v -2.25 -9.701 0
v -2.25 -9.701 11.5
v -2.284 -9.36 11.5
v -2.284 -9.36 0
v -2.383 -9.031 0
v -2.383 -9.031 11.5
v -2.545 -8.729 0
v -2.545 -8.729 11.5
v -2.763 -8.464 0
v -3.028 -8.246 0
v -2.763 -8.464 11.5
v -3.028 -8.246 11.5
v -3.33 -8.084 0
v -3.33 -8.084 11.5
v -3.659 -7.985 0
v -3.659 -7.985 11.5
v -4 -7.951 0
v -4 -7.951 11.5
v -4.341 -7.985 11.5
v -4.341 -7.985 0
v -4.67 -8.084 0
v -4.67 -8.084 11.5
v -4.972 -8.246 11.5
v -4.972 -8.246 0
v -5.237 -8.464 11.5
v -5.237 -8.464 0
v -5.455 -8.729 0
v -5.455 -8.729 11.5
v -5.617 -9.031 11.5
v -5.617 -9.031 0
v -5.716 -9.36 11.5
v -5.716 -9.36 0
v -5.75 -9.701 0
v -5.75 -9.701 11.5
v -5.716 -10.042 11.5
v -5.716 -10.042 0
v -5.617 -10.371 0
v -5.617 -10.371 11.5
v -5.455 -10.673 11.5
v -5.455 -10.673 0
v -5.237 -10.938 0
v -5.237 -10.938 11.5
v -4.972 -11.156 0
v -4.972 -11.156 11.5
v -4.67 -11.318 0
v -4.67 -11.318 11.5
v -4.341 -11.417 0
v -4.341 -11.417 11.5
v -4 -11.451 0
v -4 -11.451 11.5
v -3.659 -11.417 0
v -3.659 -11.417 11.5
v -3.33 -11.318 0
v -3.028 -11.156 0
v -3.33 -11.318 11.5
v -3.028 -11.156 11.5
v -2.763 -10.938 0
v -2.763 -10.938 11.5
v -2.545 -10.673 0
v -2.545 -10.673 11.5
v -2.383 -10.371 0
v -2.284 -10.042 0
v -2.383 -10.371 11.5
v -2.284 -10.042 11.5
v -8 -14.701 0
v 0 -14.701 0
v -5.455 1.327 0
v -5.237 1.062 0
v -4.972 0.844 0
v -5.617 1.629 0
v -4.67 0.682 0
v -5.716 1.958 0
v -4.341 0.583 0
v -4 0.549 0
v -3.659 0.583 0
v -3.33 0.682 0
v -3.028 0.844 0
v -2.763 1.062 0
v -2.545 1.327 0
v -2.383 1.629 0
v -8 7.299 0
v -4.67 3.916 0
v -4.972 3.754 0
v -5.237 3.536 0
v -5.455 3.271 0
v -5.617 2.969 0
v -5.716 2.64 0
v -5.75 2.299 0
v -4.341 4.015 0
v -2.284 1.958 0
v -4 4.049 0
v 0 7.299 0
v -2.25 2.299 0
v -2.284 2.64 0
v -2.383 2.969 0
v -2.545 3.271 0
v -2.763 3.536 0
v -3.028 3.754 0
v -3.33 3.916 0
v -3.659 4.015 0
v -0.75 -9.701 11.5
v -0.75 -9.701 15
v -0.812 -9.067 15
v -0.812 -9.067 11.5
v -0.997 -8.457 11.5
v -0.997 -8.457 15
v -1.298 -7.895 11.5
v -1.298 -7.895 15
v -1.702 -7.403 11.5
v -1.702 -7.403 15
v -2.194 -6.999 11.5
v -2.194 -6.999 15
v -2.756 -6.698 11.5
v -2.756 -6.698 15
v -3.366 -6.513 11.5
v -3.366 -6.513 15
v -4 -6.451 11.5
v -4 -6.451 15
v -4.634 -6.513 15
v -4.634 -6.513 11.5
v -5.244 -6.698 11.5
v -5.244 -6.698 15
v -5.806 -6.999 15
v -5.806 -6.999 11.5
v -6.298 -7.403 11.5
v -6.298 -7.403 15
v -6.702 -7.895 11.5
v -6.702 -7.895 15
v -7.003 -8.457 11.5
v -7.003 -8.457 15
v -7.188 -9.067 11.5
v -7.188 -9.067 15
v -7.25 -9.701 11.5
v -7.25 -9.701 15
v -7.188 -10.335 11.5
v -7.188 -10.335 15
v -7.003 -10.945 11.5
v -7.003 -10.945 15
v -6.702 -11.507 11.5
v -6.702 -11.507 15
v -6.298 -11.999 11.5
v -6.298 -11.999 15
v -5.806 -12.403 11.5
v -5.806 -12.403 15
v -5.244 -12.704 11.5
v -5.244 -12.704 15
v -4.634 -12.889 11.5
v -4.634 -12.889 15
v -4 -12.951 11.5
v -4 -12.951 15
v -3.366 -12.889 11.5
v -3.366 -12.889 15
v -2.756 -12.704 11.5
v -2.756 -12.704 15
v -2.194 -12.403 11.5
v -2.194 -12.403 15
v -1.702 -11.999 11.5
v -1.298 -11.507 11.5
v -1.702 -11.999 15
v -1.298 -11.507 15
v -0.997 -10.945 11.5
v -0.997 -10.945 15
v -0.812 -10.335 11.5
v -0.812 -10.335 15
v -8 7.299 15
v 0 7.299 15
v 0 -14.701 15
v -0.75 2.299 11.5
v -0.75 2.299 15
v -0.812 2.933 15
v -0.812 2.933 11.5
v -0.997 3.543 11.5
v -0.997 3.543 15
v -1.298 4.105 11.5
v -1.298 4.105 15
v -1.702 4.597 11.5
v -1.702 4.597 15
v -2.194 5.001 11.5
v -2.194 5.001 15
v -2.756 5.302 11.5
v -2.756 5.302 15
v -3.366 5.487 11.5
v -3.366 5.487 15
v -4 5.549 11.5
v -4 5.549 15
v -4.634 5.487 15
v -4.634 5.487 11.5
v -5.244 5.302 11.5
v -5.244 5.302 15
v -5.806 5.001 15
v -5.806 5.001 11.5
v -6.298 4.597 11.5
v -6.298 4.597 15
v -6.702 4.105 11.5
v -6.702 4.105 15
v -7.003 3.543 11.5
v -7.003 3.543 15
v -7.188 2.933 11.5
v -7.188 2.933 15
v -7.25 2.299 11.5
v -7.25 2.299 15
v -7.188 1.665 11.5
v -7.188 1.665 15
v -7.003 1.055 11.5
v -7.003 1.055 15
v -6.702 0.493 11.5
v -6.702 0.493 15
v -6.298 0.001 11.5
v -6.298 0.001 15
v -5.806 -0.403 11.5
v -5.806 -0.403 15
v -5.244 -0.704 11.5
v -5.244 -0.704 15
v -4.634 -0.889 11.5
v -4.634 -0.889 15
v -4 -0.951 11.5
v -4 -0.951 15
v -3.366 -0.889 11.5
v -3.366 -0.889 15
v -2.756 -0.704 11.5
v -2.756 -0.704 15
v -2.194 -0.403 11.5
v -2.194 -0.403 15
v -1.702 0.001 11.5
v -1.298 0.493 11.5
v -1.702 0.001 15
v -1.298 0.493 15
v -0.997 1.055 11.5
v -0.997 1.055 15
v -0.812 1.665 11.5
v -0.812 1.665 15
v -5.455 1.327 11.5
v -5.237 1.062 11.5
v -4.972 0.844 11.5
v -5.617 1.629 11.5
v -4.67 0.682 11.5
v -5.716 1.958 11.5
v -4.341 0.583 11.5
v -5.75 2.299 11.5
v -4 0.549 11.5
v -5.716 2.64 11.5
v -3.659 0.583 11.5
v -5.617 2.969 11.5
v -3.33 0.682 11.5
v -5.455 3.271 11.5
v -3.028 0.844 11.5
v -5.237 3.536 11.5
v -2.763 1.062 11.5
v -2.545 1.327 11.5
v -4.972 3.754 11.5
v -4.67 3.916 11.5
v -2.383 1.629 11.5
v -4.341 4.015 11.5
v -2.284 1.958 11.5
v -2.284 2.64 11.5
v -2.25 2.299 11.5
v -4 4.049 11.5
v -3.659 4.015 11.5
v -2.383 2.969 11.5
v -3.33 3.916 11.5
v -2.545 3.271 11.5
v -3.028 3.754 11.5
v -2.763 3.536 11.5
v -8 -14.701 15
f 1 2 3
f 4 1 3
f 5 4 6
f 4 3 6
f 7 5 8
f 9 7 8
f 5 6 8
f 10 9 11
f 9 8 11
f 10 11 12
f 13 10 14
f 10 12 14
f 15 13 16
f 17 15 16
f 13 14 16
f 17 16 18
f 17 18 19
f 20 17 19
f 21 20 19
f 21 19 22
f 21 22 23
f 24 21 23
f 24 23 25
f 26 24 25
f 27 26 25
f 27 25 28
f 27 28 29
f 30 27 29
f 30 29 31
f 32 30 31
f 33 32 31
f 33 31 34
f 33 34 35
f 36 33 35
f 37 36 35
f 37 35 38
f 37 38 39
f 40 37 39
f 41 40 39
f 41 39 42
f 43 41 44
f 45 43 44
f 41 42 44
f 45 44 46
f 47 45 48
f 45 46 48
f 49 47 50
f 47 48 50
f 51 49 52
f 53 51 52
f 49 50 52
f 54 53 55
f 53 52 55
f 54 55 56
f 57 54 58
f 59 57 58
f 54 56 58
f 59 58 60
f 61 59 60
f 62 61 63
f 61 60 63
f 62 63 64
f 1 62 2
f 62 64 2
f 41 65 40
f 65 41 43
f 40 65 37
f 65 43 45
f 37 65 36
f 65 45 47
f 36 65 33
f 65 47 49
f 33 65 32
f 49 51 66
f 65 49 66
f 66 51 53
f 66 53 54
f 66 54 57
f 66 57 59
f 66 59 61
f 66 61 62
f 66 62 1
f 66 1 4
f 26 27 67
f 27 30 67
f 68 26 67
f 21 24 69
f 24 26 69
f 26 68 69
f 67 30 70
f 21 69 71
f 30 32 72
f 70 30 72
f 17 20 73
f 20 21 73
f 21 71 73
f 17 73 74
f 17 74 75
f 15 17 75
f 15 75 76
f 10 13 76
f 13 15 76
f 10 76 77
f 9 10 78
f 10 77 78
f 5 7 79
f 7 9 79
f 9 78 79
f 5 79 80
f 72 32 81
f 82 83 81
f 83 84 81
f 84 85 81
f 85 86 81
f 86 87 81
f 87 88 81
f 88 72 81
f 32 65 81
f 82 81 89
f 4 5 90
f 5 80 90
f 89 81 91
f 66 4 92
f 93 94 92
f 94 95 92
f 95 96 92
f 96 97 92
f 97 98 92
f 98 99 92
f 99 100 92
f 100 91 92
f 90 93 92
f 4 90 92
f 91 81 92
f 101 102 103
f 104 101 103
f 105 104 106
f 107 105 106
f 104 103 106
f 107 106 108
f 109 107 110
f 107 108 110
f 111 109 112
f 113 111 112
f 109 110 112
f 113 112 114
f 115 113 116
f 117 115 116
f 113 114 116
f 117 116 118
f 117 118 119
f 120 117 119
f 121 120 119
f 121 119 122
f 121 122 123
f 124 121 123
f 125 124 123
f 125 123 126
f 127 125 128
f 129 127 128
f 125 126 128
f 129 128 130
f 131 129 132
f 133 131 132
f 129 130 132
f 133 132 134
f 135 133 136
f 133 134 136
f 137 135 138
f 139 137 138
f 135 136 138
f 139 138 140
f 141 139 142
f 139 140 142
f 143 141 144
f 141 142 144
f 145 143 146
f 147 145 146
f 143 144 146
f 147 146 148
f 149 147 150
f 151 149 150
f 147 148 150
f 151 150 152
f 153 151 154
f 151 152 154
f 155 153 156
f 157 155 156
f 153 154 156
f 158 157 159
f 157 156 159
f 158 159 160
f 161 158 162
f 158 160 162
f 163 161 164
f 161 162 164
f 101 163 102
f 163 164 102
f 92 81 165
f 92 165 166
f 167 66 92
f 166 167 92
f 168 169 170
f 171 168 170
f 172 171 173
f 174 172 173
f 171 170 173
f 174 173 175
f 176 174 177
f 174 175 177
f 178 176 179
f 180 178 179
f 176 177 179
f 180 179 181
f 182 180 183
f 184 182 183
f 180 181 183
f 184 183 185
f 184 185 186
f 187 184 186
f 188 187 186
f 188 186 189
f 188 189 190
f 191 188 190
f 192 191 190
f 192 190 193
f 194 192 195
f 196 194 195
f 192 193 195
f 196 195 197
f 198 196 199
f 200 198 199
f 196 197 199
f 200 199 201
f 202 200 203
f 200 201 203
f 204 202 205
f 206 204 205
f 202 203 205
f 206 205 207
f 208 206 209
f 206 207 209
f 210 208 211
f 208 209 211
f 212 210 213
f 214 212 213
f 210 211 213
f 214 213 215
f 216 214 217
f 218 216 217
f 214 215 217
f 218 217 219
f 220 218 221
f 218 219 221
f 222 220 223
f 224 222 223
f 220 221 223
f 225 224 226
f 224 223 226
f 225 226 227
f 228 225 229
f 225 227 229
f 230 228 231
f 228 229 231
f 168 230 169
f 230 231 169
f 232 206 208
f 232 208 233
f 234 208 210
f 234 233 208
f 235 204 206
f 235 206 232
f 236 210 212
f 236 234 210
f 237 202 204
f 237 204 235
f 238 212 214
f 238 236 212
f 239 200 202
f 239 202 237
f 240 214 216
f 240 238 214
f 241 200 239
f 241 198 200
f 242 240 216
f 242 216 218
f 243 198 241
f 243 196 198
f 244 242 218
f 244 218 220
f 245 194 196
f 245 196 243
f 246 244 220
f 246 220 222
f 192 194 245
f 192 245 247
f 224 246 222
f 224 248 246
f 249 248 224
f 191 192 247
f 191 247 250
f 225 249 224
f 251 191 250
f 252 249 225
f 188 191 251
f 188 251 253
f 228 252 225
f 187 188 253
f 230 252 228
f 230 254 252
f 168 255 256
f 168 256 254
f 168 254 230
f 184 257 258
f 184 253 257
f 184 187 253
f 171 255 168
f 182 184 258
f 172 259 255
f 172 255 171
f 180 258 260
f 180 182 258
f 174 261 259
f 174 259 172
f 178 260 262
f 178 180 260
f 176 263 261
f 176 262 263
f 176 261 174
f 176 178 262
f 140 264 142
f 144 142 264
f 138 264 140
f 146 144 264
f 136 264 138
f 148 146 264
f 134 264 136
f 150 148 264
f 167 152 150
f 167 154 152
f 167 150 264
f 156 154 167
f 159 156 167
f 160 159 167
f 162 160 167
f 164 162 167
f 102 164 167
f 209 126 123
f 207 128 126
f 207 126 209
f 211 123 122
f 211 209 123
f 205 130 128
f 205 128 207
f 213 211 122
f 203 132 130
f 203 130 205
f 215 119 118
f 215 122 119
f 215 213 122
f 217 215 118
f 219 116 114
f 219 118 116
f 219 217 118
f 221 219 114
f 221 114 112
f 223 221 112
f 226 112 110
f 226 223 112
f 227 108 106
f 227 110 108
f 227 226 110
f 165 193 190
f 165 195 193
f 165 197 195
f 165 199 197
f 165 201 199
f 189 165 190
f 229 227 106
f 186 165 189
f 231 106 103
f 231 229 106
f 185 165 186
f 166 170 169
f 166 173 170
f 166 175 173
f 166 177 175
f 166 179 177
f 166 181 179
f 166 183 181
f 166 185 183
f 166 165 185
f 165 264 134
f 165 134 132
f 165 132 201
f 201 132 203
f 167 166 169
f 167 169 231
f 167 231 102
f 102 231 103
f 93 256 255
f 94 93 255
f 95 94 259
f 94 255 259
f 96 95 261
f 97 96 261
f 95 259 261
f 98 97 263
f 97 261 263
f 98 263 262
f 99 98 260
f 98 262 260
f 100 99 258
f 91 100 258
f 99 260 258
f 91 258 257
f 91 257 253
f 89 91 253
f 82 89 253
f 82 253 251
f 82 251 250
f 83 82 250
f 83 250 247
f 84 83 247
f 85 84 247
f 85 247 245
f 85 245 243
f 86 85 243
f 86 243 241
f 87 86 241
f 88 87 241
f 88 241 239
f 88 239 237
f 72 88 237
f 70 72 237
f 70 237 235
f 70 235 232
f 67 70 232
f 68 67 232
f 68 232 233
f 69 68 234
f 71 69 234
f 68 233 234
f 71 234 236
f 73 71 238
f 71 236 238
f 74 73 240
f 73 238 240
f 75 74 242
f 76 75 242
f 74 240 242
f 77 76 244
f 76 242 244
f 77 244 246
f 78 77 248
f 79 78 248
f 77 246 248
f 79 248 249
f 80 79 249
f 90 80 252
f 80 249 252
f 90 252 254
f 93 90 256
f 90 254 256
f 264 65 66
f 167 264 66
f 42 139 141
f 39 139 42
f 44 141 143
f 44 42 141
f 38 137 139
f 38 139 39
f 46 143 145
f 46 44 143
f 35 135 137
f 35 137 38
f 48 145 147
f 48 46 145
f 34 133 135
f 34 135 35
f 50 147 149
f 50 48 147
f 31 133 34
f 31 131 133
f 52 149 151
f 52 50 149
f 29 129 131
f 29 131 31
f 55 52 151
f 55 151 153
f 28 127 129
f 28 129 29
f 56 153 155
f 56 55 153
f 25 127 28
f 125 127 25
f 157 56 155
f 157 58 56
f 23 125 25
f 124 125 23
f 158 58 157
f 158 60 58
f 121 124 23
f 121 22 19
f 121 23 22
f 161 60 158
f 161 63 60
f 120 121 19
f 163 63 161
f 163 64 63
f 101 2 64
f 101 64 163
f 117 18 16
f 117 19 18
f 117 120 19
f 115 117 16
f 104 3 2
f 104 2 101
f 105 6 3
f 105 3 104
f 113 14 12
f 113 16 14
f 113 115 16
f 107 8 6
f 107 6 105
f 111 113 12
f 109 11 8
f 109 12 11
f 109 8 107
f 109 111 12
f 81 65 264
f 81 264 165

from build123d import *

# Parameters (mm, degrees)
SKETCH1_W           = 8
SKETCH1_H           = 22
BOSS_EXTRUDE1_DEPTH = 15
SKETCH2_R           = 1.75
CUT_EXTRUDE1_DEPTH  = 16
SKETCH3_R           = 3.25
CUT_EXTRUDE2_DEPTH  = 3.5


with BuildPart() as part:
    # Sketch1 → Boss-Extrude1 (new body)
    with BuildSketch(Plane.XY):
        with Locations((-4, -3.701030928)):
            Rectangle(SKETCH1_W, SKETCH1_H)
    extrude(amount=BOSS_EXTRUDE1_DEPTH)

    # Sketch2 → Cut-Extrude1 (cut, through all)
    with BuildSketch(Plane.XY.offset(15)):
        with Locations((-4, 2.298969072)):
            Circle(SKETCH2_R)
        with Locations((-4, -9.701030928)):
            Circle(SKETCH2_R)
    extrude(amount=-CUT_EXTRUDE1_DEPTH, mode=Mode.SUBTRACT)

    # Sketch3 → Cut-Extrude2 (cut)
    with BuildSketch(Plane.XY.offset(15)):
        with Locations((-4, 2.298969072)):
            Circle(SKETCH3_R)
        with Locations((-4, -9.701030928)):
            Circle(SKETCH3_R)
    extrude(amount=-CUT_EXTRUDE2_DEPTH, mode=Mode.SUBTRACT)


solid = part.part
